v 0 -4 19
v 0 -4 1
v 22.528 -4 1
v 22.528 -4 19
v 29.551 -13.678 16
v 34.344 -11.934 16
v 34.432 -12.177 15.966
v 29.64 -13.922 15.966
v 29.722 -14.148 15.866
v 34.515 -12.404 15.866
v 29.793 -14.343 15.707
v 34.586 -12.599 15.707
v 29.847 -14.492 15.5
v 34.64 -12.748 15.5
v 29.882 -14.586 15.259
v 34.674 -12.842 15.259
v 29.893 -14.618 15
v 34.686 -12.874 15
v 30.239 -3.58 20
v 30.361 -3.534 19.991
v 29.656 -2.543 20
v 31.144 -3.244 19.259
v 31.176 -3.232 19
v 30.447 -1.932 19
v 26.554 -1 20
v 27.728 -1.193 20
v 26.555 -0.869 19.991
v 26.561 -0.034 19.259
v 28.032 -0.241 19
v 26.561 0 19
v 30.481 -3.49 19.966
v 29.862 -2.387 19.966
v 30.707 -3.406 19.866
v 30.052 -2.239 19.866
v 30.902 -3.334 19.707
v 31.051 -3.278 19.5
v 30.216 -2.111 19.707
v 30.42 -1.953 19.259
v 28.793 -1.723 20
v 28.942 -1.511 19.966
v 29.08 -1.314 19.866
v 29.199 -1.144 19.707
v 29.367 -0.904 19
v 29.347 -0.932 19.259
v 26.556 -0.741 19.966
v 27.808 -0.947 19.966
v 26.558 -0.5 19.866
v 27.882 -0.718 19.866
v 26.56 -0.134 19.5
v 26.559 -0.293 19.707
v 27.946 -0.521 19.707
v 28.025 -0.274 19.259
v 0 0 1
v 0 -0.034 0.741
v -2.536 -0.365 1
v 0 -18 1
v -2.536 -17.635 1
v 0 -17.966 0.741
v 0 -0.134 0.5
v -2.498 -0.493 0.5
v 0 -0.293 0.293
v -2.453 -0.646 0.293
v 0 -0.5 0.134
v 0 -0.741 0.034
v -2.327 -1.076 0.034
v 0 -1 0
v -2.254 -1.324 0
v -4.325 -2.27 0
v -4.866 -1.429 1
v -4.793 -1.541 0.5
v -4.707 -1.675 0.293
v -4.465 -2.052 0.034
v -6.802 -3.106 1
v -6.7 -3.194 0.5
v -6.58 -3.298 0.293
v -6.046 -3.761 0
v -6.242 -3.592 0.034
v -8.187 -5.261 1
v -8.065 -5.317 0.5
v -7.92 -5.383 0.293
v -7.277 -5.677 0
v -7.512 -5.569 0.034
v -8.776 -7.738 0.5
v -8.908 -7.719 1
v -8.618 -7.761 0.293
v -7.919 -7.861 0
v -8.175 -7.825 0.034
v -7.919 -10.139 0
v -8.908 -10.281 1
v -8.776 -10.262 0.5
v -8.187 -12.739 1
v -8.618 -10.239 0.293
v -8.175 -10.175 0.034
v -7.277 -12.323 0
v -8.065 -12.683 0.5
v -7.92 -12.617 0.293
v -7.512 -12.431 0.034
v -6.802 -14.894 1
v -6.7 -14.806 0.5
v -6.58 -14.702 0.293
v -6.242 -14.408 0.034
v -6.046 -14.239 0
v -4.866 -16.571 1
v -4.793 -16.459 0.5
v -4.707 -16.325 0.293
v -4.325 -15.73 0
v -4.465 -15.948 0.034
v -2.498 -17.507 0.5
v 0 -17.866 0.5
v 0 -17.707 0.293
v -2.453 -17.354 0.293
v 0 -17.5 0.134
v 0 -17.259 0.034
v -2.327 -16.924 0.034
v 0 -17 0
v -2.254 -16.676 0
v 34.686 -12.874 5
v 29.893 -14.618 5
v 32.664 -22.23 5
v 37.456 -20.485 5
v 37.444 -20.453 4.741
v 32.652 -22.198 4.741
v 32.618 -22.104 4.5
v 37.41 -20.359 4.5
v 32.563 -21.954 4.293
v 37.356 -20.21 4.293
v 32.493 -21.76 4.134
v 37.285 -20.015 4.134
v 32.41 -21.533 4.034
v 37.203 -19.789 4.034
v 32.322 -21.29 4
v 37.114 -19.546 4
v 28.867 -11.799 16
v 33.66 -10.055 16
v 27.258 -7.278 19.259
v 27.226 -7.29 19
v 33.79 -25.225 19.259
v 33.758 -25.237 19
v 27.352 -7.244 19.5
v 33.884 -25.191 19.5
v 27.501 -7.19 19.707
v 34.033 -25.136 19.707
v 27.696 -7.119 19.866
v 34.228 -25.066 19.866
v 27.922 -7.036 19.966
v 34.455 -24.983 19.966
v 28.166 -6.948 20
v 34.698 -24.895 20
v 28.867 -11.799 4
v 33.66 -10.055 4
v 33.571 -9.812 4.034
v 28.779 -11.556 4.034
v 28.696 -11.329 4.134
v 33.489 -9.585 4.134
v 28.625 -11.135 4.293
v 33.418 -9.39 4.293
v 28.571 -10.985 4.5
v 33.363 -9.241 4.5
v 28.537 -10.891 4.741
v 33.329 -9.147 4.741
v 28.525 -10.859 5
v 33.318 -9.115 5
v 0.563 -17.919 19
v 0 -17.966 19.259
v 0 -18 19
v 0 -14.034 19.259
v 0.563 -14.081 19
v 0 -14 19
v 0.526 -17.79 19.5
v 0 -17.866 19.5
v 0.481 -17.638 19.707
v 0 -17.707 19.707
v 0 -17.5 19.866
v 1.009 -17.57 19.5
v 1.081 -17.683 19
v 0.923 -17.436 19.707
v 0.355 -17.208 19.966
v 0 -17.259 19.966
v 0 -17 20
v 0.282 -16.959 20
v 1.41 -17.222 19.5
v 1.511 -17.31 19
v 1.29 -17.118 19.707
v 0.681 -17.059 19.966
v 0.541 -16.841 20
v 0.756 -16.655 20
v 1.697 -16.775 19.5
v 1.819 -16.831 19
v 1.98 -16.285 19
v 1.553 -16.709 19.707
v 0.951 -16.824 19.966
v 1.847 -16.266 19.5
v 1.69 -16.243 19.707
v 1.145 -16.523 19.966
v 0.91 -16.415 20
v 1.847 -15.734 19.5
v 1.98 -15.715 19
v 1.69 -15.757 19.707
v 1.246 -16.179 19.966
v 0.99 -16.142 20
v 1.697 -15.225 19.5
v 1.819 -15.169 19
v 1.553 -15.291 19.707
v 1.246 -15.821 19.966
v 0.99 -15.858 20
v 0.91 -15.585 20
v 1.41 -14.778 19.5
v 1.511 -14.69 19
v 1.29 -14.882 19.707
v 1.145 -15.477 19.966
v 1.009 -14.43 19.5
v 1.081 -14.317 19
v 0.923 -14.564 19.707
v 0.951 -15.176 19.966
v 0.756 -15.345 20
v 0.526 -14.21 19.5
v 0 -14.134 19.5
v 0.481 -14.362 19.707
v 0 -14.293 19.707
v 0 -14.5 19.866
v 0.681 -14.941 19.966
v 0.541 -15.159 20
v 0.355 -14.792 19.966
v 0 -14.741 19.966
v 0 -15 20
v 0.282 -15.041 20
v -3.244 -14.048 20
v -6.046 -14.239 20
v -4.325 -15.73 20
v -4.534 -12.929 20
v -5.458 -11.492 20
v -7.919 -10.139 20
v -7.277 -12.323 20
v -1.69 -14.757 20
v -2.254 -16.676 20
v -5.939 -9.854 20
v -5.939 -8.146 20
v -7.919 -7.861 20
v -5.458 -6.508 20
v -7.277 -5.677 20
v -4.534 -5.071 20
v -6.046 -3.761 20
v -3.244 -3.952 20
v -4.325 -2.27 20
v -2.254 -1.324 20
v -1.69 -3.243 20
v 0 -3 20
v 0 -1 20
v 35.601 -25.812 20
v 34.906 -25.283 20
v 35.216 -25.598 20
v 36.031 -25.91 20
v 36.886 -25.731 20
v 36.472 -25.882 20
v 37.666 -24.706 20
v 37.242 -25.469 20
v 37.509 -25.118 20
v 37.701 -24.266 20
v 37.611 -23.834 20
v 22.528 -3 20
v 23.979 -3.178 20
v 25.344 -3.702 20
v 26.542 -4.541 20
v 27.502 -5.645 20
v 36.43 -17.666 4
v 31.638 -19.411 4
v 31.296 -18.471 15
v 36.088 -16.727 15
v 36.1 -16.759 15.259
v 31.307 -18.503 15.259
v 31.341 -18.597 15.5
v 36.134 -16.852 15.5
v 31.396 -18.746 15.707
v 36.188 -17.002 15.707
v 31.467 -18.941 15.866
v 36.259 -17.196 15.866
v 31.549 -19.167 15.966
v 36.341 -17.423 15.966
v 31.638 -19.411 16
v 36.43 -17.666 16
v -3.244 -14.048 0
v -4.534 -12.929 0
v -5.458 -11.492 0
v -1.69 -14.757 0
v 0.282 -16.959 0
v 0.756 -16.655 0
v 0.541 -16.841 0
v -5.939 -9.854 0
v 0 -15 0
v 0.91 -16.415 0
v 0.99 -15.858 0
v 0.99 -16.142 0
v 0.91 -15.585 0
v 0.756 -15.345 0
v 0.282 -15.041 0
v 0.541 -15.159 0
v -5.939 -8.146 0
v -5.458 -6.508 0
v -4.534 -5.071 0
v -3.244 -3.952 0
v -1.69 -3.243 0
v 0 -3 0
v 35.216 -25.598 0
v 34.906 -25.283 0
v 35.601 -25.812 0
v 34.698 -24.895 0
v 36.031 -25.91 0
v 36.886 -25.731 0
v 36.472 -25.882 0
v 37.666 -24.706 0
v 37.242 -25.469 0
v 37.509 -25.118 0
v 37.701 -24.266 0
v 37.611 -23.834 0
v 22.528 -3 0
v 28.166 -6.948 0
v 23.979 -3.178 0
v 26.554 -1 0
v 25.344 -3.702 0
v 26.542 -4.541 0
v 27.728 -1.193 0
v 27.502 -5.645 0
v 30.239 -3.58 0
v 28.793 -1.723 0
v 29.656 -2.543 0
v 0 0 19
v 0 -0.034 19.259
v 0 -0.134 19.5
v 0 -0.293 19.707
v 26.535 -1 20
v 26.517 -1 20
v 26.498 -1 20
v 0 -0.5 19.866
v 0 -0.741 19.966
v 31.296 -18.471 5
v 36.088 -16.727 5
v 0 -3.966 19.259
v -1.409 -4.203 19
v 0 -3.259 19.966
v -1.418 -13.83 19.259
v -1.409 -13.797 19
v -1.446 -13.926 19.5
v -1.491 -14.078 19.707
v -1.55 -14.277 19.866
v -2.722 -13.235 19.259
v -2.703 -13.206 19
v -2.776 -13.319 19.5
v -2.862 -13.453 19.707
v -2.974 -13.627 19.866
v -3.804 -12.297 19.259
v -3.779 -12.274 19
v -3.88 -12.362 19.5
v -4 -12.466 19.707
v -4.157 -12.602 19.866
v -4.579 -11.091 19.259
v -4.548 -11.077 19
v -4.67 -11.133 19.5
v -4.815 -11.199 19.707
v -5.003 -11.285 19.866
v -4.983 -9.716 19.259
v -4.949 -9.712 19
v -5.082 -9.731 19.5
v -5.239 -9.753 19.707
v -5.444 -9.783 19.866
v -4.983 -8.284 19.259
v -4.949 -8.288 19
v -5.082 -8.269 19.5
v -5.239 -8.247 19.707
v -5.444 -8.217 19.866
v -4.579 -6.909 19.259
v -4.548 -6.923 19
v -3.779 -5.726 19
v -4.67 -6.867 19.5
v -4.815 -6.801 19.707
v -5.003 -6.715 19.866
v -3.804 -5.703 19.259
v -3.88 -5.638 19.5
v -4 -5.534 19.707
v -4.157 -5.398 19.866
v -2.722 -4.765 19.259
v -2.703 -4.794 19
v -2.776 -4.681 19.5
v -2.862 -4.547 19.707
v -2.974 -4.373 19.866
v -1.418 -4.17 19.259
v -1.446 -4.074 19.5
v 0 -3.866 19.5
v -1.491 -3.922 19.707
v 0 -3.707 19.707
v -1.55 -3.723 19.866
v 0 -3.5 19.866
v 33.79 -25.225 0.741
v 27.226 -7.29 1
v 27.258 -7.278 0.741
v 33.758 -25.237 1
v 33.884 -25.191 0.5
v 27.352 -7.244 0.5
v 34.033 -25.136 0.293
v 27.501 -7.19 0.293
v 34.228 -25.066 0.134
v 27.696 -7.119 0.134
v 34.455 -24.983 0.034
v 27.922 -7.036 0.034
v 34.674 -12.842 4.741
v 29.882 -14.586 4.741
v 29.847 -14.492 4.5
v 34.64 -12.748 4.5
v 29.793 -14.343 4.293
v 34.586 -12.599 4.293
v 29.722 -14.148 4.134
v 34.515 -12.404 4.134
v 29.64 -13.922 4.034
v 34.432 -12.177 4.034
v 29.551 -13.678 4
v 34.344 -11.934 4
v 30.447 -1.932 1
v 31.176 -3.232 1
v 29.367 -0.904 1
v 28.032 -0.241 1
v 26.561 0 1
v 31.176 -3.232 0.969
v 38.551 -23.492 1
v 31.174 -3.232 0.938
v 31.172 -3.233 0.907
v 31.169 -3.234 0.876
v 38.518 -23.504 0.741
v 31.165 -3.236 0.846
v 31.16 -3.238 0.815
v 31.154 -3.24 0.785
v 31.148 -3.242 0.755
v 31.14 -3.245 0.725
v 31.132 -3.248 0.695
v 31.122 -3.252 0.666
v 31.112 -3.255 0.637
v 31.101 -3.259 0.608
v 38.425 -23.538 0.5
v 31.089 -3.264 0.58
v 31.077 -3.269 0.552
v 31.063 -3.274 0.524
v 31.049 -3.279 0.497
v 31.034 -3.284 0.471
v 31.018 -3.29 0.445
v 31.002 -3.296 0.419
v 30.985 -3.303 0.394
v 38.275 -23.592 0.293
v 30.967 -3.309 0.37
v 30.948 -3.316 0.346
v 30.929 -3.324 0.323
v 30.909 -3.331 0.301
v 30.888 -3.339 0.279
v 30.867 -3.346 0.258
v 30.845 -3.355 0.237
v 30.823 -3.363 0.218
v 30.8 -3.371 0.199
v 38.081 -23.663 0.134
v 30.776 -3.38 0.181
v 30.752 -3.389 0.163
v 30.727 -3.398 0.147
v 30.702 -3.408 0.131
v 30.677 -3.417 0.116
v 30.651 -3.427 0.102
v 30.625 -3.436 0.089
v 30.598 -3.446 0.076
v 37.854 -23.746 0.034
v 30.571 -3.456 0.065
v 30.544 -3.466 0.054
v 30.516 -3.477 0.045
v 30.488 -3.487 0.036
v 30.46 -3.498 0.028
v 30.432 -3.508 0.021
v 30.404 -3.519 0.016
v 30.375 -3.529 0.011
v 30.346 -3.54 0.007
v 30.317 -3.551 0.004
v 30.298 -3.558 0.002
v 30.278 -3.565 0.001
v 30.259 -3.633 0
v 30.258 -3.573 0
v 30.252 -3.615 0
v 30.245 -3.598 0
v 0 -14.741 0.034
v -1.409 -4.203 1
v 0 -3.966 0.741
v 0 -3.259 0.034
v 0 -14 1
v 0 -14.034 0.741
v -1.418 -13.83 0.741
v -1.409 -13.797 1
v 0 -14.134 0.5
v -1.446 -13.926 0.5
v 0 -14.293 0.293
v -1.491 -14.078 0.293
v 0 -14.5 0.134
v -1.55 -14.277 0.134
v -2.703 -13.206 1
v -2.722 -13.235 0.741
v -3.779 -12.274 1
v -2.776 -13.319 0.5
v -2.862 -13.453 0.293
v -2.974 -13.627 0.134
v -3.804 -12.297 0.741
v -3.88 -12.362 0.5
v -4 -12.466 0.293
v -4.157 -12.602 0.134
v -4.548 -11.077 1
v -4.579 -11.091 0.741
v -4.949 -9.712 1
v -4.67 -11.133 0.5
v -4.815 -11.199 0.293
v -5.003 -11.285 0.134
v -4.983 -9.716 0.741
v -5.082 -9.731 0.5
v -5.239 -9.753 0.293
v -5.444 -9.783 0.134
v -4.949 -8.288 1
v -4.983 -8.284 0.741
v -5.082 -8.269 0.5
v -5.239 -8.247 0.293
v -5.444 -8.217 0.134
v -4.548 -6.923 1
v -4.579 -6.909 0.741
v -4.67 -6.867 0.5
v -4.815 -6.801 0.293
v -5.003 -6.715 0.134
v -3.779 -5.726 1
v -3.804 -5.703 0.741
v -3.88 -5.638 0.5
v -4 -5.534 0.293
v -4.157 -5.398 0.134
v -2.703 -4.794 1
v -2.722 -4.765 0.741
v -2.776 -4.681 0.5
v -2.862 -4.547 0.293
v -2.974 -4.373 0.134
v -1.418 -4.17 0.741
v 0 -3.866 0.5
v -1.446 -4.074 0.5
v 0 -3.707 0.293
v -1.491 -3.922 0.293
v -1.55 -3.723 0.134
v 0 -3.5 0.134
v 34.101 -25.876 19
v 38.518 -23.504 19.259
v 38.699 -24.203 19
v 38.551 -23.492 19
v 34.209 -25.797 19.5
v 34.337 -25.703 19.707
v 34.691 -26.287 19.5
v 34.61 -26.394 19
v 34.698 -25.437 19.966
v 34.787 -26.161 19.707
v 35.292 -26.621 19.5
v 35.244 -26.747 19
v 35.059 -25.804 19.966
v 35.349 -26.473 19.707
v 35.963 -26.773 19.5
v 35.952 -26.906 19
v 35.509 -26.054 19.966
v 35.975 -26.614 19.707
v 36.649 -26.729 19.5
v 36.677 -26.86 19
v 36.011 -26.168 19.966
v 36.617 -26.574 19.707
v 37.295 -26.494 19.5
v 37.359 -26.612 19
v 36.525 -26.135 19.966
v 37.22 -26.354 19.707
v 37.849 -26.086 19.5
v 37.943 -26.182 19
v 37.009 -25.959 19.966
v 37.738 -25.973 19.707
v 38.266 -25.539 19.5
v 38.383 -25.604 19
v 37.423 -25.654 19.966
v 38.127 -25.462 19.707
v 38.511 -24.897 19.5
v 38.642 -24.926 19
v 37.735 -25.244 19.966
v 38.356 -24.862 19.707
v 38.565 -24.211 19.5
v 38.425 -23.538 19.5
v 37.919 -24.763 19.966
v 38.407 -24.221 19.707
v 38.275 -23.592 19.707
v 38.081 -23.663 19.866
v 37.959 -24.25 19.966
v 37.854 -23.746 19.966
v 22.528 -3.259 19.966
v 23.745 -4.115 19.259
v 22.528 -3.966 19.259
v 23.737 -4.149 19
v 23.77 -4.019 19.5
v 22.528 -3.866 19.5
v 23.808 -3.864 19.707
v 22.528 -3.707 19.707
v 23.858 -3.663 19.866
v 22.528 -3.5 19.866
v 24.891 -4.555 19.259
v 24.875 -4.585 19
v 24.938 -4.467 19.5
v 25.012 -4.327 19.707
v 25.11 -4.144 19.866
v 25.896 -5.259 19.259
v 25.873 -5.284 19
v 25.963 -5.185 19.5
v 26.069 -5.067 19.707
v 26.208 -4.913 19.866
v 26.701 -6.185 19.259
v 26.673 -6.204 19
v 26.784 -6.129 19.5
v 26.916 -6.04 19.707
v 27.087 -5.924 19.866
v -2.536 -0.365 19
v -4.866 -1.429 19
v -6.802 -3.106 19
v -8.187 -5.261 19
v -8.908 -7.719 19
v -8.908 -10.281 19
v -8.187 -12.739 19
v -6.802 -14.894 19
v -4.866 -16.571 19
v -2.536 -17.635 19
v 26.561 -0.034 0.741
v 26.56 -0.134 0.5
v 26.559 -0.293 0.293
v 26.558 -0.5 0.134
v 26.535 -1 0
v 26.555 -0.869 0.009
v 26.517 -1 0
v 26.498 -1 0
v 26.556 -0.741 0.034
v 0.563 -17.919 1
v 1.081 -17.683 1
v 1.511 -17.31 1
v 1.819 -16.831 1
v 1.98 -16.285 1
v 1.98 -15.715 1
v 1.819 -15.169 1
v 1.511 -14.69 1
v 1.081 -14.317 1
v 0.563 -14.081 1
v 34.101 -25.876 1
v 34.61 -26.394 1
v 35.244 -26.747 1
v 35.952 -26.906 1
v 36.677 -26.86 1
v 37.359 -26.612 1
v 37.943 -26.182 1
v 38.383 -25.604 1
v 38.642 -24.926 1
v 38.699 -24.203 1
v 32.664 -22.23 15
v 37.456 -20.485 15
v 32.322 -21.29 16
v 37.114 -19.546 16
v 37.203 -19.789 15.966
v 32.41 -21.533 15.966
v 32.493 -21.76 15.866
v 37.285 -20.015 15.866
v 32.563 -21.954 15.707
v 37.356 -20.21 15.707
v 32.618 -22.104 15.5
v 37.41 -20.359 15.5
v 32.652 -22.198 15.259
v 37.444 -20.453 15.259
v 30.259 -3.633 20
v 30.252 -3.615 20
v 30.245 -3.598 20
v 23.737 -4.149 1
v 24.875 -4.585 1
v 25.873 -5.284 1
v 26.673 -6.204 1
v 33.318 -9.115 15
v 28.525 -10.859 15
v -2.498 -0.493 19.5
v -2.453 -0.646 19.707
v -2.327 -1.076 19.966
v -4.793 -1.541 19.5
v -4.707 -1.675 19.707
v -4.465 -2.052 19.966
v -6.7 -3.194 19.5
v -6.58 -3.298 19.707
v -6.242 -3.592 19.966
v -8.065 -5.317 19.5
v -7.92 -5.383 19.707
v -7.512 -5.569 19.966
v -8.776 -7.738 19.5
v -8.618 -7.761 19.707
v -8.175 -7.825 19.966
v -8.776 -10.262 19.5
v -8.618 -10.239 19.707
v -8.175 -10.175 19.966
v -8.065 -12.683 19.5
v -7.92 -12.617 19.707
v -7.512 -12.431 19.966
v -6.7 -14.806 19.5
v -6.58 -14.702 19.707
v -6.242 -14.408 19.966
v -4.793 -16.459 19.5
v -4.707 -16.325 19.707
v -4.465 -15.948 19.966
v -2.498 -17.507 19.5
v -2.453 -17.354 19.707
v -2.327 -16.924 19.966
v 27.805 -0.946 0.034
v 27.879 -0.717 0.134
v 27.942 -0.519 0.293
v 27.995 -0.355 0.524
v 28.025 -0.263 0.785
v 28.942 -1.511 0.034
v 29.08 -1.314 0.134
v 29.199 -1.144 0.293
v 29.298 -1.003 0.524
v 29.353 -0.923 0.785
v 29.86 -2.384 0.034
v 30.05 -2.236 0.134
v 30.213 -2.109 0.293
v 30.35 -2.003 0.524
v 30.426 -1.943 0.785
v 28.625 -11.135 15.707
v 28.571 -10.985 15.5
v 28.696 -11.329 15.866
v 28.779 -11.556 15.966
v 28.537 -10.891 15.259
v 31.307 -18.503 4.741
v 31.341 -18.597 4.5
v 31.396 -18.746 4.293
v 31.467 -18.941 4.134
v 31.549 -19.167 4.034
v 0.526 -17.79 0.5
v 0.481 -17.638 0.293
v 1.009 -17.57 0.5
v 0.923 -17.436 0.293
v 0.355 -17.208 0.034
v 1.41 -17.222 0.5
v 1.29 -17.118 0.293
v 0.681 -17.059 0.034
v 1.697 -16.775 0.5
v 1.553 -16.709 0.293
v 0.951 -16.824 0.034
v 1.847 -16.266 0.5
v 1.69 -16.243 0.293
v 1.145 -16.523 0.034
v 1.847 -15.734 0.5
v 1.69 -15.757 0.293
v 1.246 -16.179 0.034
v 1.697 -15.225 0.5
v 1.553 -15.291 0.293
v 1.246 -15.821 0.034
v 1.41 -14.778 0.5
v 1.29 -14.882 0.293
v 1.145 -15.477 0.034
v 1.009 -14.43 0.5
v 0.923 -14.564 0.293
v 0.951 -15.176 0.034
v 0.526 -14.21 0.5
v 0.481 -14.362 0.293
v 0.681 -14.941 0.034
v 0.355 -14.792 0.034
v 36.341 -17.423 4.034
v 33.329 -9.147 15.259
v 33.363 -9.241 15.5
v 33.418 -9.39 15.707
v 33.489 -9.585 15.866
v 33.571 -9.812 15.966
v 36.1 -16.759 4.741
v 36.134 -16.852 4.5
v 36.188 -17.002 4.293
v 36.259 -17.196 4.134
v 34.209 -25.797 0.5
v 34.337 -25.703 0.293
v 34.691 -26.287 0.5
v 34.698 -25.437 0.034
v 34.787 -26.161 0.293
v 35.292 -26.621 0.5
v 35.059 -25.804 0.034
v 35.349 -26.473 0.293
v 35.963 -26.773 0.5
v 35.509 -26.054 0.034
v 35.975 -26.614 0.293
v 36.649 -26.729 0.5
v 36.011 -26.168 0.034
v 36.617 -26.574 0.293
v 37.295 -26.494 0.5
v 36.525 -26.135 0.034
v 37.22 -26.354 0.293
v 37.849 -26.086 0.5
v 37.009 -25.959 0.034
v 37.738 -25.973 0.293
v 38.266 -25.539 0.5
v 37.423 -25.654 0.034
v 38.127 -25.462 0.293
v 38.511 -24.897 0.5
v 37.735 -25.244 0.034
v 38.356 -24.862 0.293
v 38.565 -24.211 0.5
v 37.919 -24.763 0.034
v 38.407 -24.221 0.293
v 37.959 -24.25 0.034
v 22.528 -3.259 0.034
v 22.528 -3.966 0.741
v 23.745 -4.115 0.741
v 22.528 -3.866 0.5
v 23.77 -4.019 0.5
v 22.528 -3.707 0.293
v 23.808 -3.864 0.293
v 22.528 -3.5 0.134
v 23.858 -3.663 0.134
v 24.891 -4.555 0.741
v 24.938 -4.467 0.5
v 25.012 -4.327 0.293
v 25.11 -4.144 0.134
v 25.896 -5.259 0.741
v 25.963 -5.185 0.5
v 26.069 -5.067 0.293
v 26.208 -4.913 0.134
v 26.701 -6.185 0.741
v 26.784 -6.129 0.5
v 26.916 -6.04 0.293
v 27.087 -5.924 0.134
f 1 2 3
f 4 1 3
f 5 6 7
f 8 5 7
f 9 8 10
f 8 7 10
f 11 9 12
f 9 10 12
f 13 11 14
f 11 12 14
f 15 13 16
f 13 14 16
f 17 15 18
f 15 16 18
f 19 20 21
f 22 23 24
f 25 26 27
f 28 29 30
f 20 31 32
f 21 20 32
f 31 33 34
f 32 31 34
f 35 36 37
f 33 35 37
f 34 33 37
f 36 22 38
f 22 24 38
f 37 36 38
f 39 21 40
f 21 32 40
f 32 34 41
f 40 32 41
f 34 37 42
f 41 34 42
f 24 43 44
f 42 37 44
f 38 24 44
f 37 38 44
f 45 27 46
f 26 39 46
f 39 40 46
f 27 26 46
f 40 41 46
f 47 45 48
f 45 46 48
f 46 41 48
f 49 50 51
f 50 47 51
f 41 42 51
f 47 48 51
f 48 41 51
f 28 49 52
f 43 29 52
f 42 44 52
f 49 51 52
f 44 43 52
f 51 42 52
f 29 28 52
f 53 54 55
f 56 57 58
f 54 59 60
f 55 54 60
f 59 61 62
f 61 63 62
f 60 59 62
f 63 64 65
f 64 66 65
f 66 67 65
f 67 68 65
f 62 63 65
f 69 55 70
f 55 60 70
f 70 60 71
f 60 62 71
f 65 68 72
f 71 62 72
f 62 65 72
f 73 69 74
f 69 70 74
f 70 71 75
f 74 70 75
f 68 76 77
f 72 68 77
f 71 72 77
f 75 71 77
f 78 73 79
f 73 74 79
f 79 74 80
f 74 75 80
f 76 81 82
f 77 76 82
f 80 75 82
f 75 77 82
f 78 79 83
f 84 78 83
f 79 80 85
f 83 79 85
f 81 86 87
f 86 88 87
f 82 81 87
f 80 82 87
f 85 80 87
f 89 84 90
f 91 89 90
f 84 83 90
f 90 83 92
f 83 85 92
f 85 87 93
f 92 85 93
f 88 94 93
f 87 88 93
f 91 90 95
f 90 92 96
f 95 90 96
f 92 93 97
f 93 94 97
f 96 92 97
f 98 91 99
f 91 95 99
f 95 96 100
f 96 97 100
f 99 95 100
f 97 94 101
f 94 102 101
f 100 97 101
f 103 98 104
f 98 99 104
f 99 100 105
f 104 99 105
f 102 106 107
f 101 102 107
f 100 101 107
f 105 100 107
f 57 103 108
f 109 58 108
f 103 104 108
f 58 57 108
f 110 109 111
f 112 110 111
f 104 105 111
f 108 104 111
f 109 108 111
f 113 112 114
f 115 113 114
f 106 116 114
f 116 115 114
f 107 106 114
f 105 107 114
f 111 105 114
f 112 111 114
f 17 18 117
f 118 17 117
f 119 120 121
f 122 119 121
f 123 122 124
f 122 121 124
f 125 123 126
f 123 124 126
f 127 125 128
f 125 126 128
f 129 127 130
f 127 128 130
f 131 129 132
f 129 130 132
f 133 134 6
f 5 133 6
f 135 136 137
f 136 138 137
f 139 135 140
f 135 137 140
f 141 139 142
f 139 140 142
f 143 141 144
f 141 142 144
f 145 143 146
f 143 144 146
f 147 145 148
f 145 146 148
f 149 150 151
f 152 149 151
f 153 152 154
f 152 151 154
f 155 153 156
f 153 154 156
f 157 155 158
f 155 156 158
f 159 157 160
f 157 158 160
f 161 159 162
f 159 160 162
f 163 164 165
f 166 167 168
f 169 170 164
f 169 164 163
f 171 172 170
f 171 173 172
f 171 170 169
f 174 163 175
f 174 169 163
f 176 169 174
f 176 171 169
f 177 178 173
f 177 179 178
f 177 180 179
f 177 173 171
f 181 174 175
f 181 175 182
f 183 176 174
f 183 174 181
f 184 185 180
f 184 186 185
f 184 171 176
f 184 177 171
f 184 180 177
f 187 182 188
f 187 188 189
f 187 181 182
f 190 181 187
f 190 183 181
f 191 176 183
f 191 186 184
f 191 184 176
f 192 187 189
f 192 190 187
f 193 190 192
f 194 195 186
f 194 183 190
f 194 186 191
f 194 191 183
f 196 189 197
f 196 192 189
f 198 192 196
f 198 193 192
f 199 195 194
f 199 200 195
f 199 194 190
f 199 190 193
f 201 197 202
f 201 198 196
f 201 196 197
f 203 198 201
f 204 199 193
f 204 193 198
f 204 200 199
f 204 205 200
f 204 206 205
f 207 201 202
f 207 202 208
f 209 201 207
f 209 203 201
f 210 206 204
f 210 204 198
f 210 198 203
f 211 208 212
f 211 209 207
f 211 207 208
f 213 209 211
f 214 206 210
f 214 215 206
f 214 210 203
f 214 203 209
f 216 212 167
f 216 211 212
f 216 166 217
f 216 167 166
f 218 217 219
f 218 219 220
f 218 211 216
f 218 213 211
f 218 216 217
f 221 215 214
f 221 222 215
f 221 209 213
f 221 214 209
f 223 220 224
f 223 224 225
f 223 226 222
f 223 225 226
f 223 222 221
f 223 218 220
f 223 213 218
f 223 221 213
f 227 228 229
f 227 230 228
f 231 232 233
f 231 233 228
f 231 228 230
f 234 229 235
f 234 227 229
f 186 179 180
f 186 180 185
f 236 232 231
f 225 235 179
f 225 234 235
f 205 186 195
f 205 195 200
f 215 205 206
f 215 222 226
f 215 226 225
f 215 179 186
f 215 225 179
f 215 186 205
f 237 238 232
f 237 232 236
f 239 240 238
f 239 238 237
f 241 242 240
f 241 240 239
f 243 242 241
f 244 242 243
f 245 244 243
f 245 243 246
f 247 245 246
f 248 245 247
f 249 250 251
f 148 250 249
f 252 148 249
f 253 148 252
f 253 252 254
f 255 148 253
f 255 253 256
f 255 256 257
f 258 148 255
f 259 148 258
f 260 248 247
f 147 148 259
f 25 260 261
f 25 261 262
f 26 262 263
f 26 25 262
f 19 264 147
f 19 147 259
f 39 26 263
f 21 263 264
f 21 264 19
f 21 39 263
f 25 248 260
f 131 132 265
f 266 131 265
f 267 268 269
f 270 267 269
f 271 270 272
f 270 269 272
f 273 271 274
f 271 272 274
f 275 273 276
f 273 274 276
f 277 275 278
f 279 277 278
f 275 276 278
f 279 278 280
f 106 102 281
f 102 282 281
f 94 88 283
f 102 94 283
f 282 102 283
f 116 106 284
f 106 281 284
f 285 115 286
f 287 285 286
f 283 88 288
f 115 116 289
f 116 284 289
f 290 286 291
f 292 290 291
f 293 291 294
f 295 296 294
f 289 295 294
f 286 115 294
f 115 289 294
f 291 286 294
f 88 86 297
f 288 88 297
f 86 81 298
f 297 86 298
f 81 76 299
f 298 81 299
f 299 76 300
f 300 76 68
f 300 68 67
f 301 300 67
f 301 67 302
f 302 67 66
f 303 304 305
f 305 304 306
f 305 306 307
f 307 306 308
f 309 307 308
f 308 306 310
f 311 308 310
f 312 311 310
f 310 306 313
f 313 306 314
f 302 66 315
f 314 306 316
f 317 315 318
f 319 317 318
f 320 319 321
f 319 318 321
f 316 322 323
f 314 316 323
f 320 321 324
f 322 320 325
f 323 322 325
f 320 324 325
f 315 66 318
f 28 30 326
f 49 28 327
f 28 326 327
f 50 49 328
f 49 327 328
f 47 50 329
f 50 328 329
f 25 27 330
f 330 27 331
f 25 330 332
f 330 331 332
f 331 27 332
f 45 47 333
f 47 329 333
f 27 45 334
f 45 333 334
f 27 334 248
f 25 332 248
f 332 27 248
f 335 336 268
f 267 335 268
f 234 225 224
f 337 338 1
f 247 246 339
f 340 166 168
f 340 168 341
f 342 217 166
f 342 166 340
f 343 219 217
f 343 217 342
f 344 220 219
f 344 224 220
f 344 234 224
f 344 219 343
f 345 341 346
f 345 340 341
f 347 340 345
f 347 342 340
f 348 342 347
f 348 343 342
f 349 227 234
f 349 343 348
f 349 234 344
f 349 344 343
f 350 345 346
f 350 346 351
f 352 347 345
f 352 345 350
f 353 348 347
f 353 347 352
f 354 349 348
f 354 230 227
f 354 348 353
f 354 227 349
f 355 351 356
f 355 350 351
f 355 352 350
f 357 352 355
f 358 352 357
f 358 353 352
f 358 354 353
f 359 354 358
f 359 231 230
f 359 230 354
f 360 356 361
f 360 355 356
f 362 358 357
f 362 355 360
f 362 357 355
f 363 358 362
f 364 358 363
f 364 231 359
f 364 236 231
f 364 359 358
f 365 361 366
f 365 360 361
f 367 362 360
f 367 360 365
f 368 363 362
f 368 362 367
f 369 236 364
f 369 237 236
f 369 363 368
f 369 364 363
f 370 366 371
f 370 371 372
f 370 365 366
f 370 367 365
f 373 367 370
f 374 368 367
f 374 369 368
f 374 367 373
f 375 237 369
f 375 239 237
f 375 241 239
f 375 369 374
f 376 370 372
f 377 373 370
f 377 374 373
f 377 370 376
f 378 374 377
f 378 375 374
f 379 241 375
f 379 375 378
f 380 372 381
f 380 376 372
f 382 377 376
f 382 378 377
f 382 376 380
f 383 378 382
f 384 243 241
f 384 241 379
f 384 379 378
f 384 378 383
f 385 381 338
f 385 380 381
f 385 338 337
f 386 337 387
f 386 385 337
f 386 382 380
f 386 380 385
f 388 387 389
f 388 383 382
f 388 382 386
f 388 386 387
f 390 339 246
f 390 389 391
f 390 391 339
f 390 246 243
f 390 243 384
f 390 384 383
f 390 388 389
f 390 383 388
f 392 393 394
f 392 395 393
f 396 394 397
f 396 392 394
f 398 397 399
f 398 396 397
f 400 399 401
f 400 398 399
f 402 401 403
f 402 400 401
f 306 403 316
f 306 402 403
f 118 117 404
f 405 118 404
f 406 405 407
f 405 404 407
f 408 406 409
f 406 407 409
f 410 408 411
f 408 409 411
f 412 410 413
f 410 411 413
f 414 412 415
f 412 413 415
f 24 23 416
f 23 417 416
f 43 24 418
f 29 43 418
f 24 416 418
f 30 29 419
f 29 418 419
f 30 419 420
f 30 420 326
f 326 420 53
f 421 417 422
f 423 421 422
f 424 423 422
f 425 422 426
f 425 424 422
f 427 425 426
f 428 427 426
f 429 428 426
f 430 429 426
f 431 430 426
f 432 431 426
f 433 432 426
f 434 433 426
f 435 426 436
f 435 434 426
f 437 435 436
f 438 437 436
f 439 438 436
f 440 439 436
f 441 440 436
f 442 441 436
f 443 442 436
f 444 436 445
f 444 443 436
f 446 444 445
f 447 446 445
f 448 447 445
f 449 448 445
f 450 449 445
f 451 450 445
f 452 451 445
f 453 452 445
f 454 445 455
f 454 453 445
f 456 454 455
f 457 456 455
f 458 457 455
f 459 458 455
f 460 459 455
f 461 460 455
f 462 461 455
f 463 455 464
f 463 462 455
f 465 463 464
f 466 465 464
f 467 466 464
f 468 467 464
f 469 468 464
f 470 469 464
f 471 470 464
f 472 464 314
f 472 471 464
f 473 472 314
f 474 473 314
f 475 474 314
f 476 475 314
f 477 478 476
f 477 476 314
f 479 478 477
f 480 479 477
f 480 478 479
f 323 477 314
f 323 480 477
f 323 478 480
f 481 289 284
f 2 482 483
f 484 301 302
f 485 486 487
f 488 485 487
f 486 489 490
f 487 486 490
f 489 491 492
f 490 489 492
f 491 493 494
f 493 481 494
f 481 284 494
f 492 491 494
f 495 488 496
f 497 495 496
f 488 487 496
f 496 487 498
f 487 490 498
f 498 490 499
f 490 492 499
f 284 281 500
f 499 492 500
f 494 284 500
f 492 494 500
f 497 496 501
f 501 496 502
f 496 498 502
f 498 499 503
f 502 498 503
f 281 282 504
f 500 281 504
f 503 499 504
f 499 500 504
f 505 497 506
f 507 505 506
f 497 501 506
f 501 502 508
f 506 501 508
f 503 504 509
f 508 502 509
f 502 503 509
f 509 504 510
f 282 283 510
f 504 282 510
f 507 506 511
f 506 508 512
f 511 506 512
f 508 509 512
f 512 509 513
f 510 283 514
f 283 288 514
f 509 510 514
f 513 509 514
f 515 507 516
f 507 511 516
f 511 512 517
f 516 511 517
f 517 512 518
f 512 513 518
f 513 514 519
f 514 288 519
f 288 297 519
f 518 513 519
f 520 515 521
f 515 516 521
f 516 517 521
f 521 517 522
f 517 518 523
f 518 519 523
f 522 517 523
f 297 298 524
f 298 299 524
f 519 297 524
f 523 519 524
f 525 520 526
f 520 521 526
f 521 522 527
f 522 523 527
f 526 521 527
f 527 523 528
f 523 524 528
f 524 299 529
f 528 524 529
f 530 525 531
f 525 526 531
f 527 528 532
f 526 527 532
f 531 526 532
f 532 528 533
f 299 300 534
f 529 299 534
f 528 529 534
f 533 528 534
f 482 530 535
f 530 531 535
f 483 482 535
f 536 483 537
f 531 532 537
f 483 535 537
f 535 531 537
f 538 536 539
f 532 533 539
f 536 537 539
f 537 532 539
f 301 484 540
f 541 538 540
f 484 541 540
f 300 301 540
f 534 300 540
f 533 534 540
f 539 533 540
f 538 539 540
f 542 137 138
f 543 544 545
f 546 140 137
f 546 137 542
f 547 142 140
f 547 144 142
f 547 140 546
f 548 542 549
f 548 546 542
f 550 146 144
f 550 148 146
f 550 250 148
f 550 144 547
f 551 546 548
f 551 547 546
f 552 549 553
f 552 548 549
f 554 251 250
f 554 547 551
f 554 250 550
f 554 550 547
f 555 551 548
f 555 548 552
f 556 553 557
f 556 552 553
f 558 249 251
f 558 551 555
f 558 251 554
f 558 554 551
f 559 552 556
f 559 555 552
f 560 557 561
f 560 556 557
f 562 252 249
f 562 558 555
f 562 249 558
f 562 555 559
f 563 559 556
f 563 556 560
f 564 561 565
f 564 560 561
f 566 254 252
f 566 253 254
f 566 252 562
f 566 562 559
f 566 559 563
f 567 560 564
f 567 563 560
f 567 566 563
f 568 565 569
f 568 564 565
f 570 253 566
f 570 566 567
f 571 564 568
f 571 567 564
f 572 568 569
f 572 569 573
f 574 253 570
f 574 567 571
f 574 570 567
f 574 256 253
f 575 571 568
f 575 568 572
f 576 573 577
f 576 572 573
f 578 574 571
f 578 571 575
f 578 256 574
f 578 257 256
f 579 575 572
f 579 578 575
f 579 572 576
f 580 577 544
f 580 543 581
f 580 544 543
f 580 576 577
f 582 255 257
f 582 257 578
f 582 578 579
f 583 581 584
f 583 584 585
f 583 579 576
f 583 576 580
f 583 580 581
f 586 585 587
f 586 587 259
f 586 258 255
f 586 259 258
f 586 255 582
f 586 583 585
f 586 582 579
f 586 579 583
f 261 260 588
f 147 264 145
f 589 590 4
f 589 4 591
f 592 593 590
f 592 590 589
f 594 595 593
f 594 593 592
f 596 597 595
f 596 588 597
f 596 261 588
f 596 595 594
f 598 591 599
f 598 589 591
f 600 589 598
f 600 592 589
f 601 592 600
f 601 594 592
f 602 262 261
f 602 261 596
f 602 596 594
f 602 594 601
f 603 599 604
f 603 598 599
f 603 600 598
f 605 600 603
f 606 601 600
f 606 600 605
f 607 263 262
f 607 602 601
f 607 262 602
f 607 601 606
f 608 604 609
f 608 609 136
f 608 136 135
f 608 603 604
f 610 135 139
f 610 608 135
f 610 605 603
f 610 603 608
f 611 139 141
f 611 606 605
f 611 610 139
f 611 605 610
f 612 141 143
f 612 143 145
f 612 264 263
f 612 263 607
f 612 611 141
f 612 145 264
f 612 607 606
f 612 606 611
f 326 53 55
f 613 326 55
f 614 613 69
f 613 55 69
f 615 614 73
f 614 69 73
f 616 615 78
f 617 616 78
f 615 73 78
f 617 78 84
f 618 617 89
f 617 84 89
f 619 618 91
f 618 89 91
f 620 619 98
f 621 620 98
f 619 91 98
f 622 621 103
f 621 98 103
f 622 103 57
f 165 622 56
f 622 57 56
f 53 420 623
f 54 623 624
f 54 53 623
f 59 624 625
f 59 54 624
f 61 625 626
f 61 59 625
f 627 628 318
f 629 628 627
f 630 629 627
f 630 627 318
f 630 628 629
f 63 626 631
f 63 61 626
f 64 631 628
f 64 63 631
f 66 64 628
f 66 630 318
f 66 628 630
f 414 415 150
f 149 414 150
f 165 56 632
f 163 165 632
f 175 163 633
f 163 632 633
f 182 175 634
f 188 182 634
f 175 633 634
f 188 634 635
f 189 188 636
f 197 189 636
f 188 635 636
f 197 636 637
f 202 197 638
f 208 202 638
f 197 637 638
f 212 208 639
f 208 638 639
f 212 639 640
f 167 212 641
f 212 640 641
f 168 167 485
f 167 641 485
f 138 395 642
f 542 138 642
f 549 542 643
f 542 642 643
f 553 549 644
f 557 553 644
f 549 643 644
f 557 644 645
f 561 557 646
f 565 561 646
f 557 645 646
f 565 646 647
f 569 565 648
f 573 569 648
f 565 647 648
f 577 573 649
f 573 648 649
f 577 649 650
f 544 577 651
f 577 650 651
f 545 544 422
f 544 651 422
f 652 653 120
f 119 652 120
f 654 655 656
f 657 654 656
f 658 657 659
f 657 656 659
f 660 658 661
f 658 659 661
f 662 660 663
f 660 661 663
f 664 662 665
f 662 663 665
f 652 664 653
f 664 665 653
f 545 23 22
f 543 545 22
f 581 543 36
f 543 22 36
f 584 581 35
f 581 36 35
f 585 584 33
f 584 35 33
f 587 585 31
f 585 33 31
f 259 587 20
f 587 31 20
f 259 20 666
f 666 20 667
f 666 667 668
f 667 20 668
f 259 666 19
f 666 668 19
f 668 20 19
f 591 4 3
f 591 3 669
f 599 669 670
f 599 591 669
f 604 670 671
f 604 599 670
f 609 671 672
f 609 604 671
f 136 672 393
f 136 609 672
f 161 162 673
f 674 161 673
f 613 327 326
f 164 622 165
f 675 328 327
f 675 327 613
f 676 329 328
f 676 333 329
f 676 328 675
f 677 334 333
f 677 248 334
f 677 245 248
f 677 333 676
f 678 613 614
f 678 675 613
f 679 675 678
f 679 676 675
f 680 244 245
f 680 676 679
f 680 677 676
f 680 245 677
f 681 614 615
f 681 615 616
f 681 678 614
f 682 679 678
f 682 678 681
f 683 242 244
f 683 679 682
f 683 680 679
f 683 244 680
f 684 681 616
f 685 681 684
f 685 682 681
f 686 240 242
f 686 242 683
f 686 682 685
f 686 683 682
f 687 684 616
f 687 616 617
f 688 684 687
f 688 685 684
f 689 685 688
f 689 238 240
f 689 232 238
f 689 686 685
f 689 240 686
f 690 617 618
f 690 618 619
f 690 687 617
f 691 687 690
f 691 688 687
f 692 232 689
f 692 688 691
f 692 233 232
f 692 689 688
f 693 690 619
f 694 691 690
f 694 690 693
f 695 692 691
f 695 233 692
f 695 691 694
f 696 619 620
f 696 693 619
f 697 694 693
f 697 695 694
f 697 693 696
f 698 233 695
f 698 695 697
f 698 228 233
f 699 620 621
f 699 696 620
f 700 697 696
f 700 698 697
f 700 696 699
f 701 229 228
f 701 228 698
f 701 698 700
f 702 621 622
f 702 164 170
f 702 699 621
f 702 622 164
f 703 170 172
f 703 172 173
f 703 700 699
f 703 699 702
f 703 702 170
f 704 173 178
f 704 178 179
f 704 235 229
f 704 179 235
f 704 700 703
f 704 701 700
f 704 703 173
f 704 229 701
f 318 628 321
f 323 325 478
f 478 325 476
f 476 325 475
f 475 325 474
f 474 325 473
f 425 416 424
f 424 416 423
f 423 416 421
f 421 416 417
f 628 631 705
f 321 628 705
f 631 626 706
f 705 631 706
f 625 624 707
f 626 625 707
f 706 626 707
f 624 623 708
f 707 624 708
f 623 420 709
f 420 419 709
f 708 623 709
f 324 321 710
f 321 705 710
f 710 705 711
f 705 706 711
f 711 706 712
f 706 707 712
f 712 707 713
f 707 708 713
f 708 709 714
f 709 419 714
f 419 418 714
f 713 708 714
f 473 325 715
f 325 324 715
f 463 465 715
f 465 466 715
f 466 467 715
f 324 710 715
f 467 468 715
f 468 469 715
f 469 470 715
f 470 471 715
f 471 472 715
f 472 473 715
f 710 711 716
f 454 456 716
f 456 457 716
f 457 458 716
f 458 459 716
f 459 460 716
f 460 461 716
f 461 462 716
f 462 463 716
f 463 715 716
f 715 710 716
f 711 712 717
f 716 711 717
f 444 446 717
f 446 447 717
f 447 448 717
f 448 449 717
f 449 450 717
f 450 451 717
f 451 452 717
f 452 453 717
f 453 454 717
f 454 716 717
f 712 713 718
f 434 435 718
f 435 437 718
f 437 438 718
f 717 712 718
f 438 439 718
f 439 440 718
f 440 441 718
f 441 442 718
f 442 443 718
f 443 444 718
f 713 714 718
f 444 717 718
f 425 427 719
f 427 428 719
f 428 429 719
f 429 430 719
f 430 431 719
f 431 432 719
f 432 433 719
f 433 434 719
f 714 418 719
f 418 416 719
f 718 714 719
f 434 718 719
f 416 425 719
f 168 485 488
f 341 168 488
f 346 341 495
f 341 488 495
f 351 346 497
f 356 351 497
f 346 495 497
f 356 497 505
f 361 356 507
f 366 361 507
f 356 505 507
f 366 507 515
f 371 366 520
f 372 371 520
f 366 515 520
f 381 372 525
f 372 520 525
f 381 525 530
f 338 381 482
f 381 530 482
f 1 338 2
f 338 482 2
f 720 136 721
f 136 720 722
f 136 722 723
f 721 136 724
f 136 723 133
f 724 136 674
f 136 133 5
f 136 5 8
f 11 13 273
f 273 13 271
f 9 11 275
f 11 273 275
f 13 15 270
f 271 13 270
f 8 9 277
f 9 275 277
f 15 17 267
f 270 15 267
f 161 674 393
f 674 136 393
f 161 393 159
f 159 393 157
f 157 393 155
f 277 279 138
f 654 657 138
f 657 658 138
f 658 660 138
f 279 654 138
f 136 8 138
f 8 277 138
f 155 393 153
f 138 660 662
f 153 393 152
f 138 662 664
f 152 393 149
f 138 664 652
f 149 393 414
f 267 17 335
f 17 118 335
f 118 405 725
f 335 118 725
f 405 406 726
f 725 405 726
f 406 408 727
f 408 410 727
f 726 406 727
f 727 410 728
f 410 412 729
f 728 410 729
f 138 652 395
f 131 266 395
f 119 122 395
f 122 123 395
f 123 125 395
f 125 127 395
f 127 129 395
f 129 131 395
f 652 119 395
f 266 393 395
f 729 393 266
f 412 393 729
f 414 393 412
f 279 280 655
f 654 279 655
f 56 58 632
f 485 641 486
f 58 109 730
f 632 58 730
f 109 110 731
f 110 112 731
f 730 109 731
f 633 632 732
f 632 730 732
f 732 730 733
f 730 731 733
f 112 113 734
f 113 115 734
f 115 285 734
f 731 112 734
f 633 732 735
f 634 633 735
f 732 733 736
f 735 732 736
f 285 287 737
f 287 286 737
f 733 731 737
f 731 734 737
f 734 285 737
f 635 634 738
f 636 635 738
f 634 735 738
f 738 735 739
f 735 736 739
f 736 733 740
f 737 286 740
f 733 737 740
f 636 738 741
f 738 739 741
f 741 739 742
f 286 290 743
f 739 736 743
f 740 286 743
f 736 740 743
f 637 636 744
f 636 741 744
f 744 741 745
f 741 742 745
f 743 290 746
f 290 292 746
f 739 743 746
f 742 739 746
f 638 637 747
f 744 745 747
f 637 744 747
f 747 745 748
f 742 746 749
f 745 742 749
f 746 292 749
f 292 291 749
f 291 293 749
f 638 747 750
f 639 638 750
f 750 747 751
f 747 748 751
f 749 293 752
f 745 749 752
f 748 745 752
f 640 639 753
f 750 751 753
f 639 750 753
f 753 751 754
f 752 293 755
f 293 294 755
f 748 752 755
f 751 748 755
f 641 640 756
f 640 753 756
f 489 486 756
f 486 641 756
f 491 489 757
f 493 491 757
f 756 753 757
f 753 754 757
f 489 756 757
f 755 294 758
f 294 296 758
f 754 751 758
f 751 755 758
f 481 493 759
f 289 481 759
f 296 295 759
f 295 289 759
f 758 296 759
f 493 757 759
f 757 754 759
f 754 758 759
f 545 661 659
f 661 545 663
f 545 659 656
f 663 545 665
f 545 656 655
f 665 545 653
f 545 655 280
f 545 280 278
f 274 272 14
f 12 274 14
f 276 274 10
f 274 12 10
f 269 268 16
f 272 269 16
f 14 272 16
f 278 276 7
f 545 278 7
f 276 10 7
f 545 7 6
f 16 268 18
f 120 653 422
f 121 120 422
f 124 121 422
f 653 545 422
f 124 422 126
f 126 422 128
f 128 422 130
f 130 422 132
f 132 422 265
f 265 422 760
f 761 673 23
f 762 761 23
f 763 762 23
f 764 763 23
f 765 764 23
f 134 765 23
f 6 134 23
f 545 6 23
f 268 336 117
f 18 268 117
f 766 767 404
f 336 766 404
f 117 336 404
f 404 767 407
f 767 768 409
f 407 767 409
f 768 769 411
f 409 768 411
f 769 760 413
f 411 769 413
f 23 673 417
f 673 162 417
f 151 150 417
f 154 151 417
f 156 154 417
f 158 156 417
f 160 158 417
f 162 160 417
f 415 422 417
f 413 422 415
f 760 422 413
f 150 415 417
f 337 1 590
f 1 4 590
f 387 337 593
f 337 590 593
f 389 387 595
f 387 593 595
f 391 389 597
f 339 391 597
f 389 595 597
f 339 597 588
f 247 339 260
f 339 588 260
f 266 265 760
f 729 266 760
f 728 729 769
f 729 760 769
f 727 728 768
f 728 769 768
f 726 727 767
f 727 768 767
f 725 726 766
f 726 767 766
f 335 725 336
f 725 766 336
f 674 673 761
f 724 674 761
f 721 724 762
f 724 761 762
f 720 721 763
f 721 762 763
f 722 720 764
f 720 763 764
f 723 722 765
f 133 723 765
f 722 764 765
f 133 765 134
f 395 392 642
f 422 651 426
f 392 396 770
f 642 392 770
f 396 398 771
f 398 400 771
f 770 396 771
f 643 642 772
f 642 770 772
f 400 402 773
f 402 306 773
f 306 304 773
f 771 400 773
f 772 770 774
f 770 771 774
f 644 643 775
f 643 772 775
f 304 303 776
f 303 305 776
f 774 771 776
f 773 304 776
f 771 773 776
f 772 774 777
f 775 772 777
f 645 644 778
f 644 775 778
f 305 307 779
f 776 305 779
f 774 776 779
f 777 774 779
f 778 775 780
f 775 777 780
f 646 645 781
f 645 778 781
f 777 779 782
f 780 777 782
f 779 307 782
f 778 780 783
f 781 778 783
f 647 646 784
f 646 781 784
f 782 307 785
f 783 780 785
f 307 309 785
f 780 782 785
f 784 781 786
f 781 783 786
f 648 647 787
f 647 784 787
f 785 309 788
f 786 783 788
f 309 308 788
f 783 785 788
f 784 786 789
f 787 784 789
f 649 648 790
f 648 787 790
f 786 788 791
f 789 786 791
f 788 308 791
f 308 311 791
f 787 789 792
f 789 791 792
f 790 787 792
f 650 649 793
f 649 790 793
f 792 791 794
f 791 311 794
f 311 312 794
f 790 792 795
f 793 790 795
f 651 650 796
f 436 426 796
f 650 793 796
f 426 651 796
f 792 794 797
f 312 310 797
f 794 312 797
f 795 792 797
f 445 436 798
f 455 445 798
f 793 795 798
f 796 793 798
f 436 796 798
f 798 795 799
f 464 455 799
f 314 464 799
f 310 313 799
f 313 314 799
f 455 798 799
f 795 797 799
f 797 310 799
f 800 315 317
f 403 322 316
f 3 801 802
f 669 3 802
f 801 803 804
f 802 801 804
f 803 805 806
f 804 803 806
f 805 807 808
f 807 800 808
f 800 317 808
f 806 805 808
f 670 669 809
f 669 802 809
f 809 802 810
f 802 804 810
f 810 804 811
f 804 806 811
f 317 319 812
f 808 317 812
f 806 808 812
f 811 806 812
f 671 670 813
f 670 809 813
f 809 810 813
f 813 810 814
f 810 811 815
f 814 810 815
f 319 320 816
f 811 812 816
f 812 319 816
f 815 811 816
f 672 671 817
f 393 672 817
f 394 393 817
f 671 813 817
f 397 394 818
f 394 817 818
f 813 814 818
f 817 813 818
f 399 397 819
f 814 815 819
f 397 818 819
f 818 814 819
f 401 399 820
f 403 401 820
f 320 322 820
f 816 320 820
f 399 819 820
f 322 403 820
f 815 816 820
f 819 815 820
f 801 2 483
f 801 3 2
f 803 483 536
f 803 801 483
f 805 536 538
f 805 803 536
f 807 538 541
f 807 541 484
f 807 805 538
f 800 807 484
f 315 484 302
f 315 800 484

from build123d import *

# Parameters (mm, degrees)
F1_DEPTH    = 20
F3_DEPTH    = 5.1
F4_R        = 5
F5_R        = 1
F6_R        = 1
F7_T1_DEPTH = 20
F7_T4_ANGLE = 70
F7_T6_ANGLE = 70


# Not quite as in the source:
# - a fillet or chamfer that OpenCascade refuses, or shapes differently, is made with other operations: its cross-section is extruded or revolved along the edge and cut away or added


with BuildPart() as f1:
    # F0 (on Top) → F1 (new body)
    with BuildSketch(Plane.XY):
        with BuildLine():
            Line((30, 0), (0, 0))
            ThreePointArc((0, 0), (-9, -9), (0, -18))
            ThreePointArc((0, -18), (2, -16), (0, -14))
            ThreePointArc((0, -14), (-5, -9), (0, -4))
            Line((0, -4), (26.0285742974, -4))
            Line((26.0285742974, -4), (33.7580712171, -25.2366182506))
            ThreePointArc((33.7580712171, -25.2366182506), (37.0264387656, -26.7606830681), (38.5505035831, -23.4923155196))
            Line((38.5505035831, -23.4923155196), (30, 0))
        make_face()
    extrude(amount=F1_DEPTH)

    # F2 (on face) → F3 (cut, through all)
    with BuildSketch(Plane(origin=(26.4906666468, 9.6418141453, 0), x_dir=(-0.3420201433, 0.9396926208, 0), z_dir=(0.9396926208, 0.3420201433, 0))):
        with BuildLine():
            ThreePointArc((-19.9606042998, 15), (-20.2534975186, 15.7071067812), (-20.9606042998, 16))
            Line((-20.9606042998, 16), (-22.9606042998, 16))
            ThreePointArc((-22.9606042998, 16), (-23.667711081, 15.7071067812), (-23.9606042998, 15))
            Line((-23.9606042998, 15), (-23.9606042998, 5))
            ThreePointArc((-23.9606042998, 5), (-23.667711081, 4.2928932188), (-22.9606042998, 4))
            Line((-22.9606042998, 4), (-20.9606042998, 4))
            ThreePointArc((-20.9606042998, 4), (-20.2534975186, 4.2928932188), (-19.9606042998, 5))
            Line((-19.9606042998, 5), (-19.9606042998, 15))
        make_face()
        with BuildLine():
            ThreePointArc((-28.0606042998, 15), (-28.3534975186, 15.7071067812), (-29.0606042998, 16))
            Line((-29.0606042998, 16), (-31.0606042998, 16))
            ThreePointArc((-31.0606042998, 16), (-31.767711081, 15.7071067812), (-32.0606042998, 15))
            Line((-32.0606042998, 15), (-32.0606042998, 5))
            ThreePointArc((-32.0606042998, 5), (-31.767711081, 4.2928932188), (-31.0606042998, 4))
            Line((-31.0606042998, 4), (-29.0606042998, 4))
            ThreePointArc((-29.0606042998, 4), (-28.3534975186, 4.2928932188), (-28.0606042998, 5))
            Line((-28.0606042998, 5), (-28.0606042998, 15))
        make_face()
    extrude(amount=-F3_DEPTH, mode=Mode.SUBTRACT)

    # F4
    f4_edges = [f1.edges().sort_by_distance(p)[0] for p in [
        (26.028574, -4, 10),
    ]]
    fillet(f4_edges, radius=F4_R)

    # F5
    f5_edges = [f1.edges().sort_by_distance(p)[0] for p in [
        (15, 0, 20),
        (11.263768, -4, 20),
        (25.395419, -4.90424, 20),
        (-5, -9, 20),
        (30.492035, -16.263259, 20),
        (2, -16, 20),
        (37.026439, -26.760683, 20),
        (-9, -9, 20),
        (34.275252, -11.746158, 20),
    ]]
    fillet(f5_edges, radius=F5_R)

    # F6
    f6_edges = [f1.edges().sort_by_distance(p)[0] for p in [
        (11.263768, -4, 0),
        (25.395419, -4.90424, 0),
        (-5, -9, 0),
        (30.492035, -16.263259, 0),
        (2, -16, 0),
        (37.026439, -26.760683, 0),
        (-9, -9, 0),
        (34.275252, -11.746158, 0),
        (15, 0, 0),
    ]]
    fillet(f6_edges, radius=F6_R)

    # F7: fillet of radius 5 on 1 edges, made by hand

    # F7_s2 → F7_t1 (cut)
    with BuildSketch(Plane.XY):
        with BuildLine():
            ThreePointArc((31.1982351897, -3.290954605), (29.3668444907, -0.9042397786), (26.497693671, 0.0004))
            Line((26.497693671, 0.0004), (26.497693671, 0.5006211803))
            ThreePointArc((26.497693671, 0.5006211803), (28.2488468355, 0.5002211803), (30, 0.5002211803))
            Line((30, 0.5002211803), (30.4700541519, 0.1710857198))
            ThreePointArc((30.4700541519, 0.1710857198), (31.0689838082, -1.4744599868), (31.6682893415, -3.1198688852))
            Line((31.6682893415, -3.1198688852), (31.1982351897, -3.290954605))
        make_face()
    extrude(amount=F7_T1_DEPTH, mode=Mode.SUBTRACT)

    # F7_s3 → F7_t4 (revolve, cut)
    with BuildSketch(Plane.YZ.offset(26.497693671)):
        with BuildLine():
            ThreePointArc((-0.9996, 0), (-0.2924932188, 0.2928932188), (0.0004, 1))
            Line((0.0004, 1), (0.0004, 0))
            Line((0.0004, 0), (-0.9996, 0))
        make_face()
    revolve(axis=Axis((26.497693671, -5.0018118027, 0), (0, 0, -1)), revolution_arc=F7_T4_ANGLE, mode=Mode.SUBTRACT)

    # F7_s5 → F7_t6 (revolve, cut)
    with BuildSketch(Plane(origin=(4.7071926658, -12.9329055584, 0), x_dir=(0, 0, 1), z_dir=(0.3420201433, -0.9396926208, 0))):
        with BuildLine():
            ThreePointArc((20, -27.1911786236), (19.7071067812, -27.8982854048), (19, -28.1911786236))
            Line((19, -28.1911786236), (20, -28.1911786236))
            Line((20, -28.1911786236), (20, -27.1911786236))
        make_face()
    revolve(axis=Axis((26.497693671, -5.0018118027, 20), (0, 0, 1)), revolution_arc=F7_T6_ANGLE, mode=Mode.SUBTRACT)


solid = f1.part
